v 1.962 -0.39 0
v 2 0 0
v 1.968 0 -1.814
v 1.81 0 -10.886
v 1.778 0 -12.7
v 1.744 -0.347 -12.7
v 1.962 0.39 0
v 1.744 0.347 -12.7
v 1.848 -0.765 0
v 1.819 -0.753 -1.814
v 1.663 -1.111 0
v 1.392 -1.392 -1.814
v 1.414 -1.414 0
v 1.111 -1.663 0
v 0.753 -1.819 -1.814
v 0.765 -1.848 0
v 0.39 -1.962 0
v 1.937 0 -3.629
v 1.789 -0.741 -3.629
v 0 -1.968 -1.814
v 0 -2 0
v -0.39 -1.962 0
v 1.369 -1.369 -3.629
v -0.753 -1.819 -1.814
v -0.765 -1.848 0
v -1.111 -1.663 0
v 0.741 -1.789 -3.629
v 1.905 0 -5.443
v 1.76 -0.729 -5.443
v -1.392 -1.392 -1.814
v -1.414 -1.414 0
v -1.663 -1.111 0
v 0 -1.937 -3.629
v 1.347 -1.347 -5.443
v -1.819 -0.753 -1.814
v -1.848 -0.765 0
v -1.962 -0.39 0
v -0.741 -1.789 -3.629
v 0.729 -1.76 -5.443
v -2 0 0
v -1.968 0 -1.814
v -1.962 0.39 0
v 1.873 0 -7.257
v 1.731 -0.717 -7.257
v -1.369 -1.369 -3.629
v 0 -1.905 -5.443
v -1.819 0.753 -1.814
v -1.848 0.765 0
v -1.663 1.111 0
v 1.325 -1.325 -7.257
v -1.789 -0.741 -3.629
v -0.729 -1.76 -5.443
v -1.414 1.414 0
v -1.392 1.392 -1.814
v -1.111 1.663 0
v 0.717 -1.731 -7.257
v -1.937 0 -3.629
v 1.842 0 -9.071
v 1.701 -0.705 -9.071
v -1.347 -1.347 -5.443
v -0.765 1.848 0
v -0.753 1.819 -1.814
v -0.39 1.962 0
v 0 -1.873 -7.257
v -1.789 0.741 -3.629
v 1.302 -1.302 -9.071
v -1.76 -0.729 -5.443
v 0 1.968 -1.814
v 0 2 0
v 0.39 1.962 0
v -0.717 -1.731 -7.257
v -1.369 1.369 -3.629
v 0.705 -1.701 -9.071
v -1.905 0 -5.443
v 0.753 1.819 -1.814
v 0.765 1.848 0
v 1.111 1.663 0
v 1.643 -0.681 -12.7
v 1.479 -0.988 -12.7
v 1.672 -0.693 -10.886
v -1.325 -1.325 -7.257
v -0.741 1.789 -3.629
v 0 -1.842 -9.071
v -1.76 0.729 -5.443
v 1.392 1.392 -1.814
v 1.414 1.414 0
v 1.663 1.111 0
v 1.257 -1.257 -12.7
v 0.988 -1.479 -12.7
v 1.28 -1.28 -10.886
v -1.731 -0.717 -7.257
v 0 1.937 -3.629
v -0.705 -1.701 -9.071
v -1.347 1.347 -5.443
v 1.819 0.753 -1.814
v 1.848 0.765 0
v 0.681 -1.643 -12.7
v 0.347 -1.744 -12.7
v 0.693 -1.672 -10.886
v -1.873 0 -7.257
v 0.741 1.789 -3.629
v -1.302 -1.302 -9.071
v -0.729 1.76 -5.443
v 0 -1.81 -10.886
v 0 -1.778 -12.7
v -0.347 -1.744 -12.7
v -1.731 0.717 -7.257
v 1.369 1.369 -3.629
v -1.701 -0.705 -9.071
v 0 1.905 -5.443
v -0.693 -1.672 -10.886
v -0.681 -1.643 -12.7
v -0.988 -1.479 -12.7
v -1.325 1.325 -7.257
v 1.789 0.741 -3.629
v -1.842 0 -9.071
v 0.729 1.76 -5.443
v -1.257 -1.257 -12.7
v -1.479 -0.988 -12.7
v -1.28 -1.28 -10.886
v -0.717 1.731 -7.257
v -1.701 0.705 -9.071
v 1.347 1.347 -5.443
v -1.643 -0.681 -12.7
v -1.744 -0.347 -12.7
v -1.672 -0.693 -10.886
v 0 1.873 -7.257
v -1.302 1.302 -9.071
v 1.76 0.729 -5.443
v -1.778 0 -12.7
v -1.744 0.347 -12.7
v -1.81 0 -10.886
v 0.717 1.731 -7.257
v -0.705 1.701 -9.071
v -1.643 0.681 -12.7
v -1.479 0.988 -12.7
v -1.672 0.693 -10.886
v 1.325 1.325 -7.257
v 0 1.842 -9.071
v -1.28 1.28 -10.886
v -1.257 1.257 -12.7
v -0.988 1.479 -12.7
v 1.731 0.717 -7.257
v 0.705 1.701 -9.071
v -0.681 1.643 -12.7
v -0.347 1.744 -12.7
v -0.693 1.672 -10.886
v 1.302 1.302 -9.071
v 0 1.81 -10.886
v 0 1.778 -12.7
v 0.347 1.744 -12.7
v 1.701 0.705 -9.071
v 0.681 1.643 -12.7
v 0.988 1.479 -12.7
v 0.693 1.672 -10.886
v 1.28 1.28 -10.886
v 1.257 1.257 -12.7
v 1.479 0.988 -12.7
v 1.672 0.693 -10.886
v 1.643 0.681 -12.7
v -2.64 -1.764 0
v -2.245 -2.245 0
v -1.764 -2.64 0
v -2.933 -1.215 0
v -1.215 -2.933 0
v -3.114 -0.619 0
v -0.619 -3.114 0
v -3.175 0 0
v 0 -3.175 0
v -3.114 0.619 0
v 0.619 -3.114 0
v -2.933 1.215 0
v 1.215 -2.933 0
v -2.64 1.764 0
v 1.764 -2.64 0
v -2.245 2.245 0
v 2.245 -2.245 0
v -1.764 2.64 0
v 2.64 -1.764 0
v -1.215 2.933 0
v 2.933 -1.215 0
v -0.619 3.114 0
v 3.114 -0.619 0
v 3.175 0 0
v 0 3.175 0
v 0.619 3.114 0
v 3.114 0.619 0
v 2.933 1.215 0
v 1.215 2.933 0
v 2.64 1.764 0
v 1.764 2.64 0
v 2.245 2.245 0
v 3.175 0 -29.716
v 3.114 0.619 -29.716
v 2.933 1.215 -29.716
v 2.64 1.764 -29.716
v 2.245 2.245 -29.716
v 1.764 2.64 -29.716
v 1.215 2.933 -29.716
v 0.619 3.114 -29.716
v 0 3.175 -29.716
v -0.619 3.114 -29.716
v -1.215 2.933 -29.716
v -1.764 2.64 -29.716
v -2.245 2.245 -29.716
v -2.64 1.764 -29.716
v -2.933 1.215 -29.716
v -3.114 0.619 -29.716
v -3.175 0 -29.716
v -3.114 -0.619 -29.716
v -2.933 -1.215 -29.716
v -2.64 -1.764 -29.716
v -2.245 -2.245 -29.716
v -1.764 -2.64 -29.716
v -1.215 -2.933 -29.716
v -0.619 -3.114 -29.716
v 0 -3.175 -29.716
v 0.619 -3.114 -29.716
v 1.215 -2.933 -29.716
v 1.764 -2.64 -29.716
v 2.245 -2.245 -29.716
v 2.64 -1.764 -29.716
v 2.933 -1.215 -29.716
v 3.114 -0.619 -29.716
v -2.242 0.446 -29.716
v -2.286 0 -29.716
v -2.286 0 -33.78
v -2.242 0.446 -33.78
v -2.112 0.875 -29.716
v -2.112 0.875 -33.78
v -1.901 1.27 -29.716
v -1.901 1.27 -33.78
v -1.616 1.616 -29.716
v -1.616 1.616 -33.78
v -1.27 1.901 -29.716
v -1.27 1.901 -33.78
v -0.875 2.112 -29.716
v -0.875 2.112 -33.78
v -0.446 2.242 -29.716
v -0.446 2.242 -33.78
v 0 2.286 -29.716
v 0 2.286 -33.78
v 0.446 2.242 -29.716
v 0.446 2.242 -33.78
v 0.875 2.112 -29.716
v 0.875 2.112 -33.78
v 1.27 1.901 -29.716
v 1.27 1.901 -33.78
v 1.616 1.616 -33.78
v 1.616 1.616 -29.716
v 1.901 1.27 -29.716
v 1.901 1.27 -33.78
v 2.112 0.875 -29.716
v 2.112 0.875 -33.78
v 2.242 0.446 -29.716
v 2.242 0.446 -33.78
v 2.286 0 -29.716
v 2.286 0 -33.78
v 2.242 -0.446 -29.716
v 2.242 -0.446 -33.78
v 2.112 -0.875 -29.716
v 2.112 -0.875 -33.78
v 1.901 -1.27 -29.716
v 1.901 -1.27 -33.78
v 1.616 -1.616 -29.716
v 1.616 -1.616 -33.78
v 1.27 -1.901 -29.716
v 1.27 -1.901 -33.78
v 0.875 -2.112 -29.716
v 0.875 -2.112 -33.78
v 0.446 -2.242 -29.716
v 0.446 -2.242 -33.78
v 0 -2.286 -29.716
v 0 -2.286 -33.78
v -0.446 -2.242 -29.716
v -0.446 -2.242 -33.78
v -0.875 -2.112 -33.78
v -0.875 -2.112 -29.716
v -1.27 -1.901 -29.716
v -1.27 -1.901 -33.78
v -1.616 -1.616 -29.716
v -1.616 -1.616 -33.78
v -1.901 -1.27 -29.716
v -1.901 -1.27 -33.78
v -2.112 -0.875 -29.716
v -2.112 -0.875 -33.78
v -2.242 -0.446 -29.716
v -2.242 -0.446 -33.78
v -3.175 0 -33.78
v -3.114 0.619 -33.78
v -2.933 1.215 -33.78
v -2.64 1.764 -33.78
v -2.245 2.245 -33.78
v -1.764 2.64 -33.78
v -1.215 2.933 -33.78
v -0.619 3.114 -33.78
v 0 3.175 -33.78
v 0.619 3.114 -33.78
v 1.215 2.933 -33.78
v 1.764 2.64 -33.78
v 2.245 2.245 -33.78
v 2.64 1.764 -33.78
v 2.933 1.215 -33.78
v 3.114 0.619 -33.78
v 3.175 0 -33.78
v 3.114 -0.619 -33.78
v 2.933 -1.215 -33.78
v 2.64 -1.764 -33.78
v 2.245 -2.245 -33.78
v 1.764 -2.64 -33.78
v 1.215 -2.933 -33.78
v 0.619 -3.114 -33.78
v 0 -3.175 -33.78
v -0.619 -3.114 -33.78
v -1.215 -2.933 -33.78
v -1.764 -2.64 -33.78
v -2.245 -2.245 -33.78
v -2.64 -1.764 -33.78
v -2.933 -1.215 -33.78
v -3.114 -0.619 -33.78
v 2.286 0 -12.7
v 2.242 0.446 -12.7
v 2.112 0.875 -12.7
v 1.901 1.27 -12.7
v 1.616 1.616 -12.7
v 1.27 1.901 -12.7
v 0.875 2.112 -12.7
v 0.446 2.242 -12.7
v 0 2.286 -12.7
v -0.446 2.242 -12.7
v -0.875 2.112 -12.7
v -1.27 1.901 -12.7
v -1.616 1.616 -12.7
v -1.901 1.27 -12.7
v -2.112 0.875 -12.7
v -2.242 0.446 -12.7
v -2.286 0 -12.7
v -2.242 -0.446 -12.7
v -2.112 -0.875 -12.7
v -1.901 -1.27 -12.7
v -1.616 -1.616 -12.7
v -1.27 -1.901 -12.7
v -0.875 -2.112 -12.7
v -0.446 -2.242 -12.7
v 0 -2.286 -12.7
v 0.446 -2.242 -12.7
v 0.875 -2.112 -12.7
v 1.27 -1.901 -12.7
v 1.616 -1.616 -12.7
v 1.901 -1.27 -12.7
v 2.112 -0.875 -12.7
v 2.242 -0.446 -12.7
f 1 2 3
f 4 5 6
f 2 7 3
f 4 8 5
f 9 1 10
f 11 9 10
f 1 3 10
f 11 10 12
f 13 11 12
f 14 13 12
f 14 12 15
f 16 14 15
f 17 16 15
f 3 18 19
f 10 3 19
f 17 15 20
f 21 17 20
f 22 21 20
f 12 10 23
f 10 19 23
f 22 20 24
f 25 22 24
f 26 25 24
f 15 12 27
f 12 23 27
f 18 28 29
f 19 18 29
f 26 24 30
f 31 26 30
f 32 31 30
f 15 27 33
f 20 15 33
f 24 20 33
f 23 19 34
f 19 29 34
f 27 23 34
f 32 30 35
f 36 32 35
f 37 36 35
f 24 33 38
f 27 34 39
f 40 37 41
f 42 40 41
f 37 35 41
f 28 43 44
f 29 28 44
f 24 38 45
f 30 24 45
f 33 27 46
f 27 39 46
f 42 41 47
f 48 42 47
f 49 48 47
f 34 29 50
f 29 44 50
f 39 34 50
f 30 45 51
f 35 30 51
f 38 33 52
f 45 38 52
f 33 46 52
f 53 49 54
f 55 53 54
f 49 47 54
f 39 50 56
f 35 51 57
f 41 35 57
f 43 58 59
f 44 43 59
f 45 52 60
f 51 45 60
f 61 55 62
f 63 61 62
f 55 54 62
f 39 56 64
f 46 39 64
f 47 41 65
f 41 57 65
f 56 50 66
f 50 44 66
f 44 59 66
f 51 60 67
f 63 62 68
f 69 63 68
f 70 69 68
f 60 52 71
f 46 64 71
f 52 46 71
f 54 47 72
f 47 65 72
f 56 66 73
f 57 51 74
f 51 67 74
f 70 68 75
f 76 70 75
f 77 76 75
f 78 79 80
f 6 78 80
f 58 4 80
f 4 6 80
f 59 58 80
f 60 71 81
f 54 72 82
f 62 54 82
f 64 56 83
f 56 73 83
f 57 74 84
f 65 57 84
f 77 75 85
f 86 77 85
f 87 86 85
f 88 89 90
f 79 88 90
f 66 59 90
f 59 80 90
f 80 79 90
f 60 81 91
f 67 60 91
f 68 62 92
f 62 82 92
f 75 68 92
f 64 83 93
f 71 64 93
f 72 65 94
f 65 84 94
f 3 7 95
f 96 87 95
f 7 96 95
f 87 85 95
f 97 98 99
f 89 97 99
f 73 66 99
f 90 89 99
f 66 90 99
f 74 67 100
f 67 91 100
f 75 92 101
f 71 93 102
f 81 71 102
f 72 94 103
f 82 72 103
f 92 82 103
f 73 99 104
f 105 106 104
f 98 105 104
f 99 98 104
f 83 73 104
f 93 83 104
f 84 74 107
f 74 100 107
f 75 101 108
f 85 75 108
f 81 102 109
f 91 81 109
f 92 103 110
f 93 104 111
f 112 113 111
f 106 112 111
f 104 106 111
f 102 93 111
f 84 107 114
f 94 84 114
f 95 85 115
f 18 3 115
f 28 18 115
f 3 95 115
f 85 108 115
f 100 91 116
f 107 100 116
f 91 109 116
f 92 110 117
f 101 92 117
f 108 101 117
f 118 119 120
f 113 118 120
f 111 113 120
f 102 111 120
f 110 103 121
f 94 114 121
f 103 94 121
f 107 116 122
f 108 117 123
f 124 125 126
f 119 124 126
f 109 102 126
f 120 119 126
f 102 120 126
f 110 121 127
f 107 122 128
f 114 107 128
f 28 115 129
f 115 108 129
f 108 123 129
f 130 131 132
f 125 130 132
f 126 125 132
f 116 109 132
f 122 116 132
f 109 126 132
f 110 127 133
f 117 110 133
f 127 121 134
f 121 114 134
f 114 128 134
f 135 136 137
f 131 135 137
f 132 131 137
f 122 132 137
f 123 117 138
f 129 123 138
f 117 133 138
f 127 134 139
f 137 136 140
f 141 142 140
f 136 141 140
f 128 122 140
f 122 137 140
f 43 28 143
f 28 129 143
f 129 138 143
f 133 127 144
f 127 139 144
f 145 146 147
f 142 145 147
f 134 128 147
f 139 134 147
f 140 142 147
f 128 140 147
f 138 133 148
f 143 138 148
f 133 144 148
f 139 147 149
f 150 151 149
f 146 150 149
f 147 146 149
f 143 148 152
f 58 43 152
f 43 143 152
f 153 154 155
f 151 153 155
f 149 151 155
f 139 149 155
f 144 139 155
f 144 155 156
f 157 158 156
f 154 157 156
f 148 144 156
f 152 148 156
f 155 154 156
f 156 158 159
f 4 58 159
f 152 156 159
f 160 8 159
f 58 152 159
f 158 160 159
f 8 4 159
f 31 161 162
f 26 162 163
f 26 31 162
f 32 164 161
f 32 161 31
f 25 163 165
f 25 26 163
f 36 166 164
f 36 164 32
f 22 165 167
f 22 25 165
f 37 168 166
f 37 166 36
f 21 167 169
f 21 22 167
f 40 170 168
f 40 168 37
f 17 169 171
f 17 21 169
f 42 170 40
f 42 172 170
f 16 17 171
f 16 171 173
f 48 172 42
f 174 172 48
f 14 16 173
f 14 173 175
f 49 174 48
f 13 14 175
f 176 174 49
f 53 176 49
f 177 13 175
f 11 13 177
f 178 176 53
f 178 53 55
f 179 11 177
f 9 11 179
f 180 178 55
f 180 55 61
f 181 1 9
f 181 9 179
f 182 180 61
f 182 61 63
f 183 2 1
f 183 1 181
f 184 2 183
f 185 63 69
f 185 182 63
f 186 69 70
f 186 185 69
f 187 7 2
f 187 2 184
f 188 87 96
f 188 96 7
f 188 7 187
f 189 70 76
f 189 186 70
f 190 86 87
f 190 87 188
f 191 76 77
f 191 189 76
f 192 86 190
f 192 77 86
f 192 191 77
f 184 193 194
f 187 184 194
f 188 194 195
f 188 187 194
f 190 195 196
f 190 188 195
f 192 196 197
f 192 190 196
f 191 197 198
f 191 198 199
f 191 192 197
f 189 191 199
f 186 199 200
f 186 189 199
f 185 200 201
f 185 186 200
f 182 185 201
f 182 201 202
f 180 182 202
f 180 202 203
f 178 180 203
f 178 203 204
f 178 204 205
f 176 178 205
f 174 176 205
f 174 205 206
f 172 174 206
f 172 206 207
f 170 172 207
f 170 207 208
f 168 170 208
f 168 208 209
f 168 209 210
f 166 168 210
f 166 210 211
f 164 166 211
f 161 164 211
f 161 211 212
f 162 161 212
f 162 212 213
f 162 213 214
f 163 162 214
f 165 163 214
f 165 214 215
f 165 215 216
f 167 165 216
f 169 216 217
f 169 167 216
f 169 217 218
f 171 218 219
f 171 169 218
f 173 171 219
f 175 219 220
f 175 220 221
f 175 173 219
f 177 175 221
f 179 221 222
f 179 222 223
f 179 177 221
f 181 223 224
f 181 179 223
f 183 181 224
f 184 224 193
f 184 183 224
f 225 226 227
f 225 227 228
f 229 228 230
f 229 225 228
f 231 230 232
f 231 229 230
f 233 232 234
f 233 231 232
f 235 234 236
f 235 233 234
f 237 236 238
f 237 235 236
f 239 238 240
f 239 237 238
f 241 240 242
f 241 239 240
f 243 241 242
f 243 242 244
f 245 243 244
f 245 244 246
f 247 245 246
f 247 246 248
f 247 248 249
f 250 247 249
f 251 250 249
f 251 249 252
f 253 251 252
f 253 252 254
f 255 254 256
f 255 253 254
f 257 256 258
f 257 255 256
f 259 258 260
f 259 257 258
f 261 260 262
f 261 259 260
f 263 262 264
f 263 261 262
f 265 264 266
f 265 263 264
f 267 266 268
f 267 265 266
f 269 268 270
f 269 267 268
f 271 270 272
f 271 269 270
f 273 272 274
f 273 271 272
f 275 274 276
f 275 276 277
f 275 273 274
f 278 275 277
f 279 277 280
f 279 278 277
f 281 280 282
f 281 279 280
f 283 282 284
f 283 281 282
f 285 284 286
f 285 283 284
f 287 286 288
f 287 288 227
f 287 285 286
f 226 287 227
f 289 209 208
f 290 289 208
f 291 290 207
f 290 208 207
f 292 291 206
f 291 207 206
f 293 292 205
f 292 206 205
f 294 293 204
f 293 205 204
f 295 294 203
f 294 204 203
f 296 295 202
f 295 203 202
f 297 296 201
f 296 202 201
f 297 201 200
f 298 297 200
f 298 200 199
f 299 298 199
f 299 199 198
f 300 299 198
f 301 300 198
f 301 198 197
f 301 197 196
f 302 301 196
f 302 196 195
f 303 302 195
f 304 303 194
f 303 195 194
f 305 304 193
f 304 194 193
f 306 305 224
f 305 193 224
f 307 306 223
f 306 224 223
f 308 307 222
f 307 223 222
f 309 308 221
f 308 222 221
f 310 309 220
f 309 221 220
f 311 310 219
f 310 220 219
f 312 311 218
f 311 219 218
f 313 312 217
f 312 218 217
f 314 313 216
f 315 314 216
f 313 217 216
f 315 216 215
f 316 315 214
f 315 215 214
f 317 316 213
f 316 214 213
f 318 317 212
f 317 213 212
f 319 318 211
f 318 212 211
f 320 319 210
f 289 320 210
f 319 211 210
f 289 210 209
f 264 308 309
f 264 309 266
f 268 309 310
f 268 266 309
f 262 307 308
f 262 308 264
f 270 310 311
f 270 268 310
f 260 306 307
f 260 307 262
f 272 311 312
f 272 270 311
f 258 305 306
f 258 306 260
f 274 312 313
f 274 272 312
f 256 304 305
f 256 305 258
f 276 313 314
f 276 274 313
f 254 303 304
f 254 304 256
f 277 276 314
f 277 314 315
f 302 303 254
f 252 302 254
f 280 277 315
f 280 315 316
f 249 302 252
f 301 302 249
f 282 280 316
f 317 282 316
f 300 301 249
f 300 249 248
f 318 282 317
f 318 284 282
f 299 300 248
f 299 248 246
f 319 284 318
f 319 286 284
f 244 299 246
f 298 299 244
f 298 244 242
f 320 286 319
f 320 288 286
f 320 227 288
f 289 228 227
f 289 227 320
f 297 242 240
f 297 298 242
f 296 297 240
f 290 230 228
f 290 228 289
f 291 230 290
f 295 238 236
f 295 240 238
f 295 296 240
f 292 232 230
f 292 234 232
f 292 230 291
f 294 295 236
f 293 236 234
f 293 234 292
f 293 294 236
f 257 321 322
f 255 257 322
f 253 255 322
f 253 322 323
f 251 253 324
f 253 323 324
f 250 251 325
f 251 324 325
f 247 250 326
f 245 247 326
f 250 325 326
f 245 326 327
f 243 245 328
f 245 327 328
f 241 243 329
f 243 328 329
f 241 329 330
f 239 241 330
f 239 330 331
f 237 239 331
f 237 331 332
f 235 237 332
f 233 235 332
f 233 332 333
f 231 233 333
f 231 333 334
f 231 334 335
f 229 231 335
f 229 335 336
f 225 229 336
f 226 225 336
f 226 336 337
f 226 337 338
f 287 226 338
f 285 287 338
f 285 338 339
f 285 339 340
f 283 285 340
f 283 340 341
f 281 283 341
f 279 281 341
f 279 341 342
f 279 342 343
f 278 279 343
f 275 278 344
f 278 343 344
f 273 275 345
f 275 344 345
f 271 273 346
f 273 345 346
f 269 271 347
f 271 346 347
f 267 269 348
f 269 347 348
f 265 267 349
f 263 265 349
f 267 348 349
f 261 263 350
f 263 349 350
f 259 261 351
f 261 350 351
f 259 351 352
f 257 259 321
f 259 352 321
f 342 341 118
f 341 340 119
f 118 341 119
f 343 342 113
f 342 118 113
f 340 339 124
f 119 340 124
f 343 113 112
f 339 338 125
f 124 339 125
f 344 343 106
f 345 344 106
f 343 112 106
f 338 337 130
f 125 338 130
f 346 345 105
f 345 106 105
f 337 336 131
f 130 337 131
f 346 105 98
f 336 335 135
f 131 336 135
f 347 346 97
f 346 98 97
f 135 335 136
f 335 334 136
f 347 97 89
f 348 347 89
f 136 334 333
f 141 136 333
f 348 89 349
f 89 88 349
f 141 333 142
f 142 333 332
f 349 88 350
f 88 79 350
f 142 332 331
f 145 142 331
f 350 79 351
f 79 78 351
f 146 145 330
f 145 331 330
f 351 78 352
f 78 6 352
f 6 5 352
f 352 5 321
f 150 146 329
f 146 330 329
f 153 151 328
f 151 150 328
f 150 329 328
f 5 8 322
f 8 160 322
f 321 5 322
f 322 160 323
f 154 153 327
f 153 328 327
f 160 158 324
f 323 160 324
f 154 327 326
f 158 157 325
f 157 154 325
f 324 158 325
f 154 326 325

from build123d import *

# Parameters (mm, degrees)
SKETCH1_R           = 3.175
SKETCH1_R_2         = 2.286
BOSS_EXTRUDE1_DEPTH = 29.7165
SKETCH2_R           = 3.175
SKETCH2_R_2         = 2.286
BOSS_EXTRUDE2_DEPTH = 4.064
SKETCH3_R           = 2.762
SKETCH3_R_2         = 2
EXTRUDE_THIN1_DEPTH = 12.7
EXTRUDE_THIN1_TAPER = -1


with BuildPart() as part:
    # Sketch1 → Boss-Extrude1 (new body)
    with BuildSketch(Plane.XY):
        Circle(SKETCH1_R)
        Circle(SKETCH1_R_2, mode=Mode.SUBTRACT)
    extrude(amount=-BOSS_EXTRUDE1_DEPTH)

    # Sketch2 → Boss-Extrude2 (add)
    with BuildSketch(Plane(origin=(0, 0, -29.7165), x_dir=(-1, 0, 0), z_dir=(0, 0, -1))):
        Circle(SKETCH2_R)
        Circle(SKETCH2_R_2, mode=Mode.SUBTRACT)
    extrude(amount=BOSS_EXTRUDE2_DEPTH)

    # Sketch3 → Extrude-Thin1 (add)
    with BuildSketch(Plane.XY):
        Circle(SKETCH3_R)
        Circle(SKETCH3_R_2, mode=Mode.SUBTRACT)
    extrude(amount=-EXTRUDE_THIN1_DEPTH, taper=EXTRUDE_THIN1_TAPER)


solid = part.part
